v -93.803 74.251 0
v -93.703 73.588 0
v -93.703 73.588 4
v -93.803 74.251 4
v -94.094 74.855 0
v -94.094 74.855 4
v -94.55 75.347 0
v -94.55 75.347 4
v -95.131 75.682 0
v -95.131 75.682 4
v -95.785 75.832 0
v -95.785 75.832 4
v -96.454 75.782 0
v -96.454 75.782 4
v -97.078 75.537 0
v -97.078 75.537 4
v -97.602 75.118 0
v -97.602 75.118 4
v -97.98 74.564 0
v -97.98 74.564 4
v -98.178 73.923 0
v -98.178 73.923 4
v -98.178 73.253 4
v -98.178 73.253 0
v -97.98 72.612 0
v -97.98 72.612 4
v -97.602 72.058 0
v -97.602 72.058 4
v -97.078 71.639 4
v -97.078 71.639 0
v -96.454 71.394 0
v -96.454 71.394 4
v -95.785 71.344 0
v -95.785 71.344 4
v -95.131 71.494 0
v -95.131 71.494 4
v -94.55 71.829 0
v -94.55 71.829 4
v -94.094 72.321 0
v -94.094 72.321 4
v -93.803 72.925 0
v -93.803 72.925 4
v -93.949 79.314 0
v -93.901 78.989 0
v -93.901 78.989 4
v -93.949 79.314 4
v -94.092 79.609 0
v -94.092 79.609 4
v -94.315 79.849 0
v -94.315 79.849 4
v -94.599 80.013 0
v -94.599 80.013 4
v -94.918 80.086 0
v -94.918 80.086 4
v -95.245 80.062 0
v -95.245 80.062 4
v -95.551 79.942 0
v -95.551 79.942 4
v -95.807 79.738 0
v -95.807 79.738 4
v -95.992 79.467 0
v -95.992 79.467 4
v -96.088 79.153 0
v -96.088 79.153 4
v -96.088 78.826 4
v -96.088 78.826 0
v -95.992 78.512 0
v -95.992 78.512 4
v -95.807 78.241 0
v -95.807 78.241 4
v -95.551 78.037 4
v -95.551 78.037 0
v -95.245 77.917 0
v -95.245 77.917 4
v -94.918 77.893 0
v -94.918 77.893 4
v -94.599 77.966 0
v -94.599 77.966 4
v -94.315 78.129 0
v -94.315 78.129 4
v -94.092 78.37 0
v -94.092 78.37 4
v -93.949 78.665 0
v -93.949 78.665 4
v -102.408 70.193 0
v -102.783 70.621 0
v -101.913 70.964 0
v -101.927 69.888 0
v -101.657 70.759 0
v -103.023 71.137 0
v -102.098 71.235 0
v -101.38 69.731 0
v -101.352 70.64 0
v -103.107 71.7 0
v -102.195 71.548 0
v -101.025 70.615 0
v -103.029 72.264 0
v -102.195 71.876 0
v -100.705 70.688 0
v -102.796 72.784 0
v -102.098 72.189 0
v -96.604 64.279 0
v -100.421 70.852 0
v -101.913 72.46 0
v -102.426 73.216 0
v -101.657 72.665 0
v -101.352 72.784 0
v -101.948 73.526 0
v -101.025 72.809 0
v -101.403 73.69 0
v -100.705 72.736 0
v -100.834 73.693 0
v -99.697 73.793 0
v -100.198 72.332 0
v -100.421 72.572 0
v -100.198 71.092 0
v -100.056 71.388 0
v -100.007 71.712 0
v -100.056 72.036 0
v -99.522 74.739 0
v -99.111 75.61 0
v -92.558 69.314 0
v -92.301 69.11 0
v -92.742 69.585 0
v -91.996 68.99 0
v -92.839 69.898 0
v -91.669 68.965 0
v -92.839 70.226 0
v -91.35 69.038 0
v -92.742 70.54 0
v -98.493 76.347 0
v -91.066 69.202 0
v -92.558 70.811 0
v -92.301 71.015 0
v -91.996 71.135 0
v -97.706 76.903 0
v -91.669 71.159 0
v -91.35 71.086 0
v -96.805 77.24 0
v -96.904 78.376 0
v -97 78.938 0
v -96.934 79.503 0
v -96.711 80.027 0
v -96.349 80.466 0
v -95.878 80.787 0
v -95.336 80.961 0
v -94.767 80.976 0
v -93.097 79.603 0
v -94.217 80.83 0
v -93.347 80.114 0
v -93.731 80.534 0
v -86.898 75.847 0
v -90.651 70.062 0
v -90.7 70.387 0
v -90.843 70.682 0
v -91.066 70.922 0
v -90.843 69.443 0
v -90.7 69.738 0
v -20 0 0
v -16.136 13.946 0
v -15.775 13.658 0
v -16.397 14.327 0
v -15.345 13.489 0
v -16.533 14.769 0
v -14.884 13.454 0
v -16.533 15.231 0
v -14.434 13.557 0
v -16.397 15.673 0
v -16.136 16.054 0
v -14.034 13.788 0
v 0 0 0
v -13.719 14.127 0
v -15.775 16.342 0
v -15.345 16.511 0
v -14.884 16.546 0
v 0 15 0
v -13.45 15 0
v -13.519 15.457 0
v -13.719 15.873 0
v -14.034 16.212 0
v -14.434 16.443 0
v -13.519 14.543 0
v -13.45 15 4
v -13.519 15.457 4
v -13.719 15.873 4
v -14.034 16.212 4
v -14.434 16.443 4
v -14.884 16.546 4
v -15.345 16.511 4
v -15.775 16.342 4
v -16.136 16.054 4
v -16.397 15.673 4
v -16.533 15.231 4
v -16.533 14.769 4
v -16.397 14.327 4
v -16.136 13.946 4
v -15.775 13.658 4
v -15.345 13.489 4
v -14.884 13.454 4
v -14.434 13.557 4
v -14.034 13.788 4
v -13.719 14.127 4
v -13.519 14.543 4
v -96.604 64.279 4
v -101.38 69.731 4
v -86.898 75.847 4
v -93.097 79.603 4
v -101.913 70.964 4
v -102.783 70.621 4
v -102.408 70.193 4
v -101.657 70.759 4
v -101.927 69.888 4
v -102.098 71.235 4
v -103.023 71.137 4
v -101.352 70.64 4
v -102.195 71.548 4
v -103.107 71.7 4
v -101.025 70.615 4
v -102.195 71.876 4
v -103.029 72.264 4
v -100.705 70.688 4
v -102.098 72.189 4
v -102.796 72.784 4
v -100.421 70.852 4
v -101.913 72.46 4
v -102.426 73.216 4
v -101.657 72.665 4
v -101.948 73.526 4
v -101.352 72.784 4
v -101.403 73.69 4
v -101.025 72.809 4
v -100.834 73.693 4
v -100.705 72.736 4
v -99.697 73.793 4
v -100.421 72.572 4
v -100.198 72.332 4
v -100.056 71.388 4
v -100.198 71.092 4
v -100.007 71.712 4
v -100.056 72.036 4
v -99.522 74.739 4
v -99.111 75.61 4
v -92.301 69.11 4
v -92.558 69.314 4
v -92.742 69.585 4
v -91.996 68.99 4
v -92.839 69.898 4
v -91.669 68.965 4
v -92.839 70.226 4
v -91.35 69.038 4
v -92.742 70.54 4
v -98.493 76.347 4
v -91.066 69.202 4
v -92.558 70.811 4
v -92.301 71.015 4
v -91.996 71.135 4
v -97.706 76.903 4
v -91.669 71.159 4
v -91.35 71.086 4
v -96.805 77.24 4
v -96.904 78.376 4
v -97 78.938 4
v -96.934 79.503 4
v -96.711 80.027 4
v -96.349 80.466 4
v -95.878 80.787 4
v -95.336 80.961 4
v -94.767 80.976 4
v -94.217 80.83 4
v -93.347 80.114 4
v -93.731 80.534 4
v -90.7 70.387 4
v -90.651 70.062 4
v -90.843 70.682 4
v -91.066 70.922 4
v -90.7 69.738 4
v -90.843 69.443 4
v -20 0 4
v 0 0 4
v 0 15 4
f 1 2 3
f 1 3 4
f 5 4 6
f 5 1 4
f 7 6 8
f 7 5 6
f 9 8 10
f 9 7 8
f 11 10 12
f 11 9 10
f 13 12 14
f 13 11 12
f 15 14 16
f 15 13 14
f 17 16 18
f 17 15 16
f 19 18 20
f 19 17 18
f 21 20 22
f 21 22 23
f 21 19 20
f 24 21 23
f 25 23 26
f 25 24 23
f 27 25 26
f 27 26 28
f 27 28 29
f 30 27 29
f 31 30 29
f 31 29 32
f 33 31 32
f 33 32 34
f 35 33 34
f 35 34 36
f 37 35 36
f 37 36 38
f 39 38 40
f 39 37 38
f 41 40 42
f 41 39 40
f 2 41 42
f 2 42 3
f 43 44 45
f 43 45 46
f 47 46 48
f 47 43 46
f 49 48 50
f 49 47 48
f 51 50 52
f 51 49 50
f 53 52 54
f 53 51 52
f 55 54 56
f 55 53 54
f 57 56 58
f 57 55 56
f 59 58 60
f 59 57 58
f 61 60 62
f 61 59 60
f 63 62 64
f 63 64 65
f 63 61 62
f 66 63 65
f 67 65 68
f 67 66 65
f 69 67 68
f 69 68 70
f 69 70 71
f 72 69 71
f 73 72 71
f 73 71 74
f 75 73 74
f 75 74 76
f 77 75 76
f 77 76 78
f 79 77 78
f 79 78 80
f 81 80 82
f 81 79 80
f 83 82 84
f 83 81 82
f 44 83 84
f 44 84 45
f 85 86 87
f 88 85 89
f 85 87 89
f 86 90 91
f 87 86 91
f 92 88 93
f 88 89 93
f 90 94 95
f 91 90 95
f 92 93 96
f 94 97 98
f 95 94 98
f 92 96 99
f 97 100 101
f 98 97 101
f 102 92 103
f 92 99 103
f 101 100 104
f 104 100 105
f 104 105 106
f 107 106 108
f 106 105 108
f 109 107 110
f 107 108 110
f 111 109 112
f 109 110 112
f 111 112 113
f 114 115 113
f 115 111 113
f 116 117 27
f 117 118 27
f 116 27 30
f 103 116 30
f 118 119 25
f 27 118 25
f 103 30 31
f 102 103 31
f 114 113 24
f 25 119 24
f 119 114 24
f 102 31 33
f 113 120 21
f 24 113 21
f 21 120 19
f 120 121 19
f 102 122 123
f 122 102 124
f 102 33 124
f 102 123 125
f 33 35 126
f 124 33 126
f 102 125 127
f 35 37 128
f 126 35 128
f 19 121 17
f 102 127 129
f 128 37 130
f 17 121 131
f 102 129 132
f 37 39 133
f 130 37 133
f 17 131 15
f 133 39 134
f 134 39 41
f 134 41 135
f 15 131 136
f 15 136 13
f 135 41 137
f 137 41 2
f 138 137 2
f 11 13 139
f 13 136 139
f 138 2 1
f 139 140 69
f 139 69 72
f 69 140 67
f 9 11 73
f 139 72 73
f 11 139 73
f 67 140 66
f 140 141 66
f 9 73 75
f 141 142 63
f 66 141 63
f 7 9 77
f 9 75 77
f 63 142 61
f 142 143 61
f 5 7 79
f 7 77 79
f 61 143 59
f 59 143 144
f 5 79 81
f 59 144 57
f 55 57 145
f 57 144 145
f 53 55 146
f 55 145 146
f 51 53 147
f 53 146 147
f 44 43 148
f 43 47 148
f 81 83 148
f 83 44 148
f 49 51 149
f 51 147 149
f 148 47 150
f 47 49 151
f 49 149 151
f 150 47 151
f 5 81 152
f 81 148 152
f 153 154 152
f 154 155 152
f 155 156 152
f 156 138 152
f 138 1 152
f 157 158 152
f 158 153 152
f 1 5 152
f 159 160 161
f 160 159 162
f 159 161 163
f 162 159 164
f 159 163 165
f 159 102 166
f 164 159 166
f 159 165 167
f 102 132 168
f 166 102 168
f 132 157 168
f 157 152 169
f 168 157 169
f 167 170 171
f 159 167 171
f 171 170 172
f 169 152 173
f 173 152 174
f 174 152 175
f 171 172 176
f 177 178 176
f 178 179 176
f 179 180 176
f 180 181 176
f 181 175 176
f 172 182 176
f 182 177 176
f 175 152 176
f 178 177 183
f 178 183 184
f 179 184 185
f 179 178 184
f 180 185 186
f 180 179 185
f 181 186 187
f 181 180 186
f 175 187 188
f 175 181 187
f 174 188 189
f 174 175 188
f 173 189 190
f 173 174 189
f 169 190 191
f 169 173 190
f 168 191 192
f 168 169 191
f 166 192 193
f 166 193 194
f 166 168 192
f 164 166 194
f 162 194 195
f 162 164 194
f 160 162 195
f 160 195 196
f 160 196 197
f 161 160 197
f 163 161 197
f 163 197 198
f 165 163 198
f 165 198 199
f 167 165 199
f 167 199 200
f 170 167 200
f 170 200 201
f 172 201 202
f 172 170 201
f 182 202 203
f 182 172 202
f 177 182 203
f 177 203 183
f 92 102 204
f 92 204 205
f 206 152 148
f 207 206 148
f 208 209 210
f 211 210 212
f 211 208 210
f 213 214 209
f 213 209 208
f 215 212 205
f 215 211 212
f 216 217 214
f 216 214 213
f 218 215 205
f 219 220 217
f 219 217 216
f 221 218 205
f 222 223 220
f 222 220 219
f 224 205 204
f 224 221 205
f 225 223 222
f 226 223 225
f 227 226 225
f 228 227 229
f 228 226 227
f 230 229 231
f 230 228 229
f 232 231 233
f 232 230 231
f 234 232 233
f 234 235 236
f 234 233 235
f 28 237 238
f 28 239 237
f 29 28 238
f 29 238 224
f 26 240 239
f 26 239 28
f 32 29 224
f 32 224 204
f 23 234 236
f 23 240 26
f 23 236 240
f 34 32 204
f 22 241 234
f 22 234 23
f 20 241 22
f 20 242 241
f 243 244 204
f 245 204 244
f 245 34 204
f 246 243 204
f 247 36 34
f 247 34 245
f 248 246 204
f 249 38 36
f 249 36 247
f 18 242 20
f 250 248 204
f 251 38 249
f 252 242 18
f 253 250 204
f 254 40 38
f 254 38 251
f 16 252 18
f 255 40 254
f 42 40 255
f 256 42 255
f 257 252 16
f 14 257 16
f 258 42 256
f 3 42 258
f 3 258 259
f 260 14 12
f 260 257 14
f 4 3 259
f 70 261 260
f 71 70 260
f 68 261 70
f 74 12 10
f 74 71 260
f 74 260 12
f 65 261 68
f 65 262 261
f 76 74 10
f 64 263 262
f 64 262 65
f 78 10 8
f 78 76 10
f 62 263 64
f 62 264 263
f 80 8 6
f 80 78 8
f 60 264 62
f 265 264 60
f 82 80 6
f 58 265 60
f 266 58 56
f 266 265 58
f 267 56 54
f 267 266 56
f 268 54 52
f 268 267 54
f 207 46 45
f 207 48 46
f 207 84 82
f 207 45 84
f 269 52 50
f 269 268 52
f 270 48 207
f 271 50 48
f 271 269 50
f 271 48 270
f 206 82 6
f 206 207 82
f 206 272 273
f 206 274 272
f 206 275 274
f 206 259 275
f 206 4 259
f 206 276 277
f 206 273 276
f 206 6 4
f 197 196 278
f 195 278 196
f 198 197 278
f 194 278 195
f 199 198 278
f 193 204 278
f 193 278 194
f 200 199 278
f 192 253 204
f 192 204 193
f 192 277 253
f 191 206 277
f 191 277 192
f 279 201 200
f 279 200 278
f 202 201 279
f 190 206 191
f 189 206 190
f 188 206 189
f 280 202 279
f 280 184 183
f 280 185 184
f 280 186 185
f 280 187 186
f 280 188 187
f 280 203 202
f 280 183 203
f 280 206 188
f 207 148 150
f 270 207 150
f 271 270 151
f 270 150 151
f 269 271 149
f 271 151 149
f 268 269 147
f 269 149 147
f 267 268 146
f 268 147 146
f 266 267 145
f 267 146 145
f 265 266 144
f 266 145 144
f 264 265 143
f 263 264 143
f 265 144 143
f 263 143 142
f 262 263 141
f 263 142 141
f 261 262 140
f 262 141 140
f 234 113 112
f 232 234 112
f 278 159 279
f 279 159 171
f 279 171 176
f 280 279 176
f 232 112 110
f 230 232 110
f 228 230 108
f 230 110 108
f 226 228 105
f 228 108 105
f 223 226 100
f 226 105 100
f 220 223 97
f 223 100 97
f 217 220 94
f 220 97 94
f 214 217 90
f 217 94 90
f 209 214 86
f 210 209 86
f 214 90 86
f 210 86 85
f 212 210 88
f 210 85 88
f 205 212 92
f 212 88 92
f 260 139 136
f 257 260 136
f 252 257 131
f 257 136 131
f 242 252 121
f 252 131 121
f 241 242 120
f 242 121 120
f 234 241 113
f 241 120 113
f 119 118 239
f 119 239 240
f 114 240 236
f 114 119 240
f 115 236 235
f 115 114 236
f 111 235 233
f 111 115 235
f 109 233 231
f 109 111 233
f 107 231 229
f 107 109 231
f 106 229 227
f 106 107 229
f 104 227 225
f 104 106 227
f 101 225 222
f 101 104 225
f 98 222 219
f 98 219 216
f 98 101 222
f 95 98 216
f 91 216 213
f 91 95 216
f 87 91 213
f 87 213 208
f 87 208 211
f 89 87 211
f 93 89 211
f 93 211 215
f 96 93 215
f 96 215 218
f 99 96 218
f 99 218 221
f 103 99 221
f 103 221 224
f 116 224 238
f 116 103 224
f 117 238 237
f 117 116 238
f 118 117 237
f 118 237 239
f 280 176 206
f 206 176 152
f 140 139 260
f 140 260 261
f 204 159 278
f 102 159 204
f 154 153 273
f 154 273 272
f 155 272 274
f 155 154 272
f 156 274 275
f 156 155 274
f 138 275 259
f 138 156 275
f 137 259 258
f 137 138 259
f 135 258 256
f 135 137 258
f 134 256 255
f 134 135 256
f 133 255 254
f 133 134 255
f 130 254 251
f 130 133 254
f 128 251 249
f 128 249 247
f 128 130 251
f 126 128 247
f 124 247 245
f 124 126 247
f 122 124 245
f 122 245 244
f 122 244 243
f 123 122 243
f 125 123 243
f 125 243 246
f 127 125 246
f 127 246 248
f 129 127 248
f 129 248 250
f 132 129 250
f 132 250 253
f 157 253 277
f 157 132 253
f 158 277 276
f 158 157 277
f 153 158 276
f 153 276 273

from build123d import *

# Parameters (mm, degrees)
SKETCH_R   = 1.1
SKETCH_R_2 = 2.25
SKETCH_R_3 = 1.55
PAD_DEPTH  = 4


with BuildPart() as part:
    # Sketch → Pad (new body)
    with BuildSketch(Plane.XY):
        with BuildLine():
            Line((-20, 0), (0, 0))
            Line((0, 0), (0, 15))
            Line((0, 15), (-86.897903, 75.846567))
            Line((-86.897903, 75.846567), (-93.096869, 79.602543))
            ThreePointArc((-93.096869, 79.602543), (-95.613656, 80.893196), (-96.904309, 78.37641))
            Line((-96.804881, 77.239939), (-96.904309, 78.37641))
            ThreePointArc((-96.804881, 77.239939), (-98.825686, 75.998429), (-99.697425, 73.792739))
            Line((-99.697425, 73.792739), (-100.833896, 73.69331))
            ThreePointArc((-100.833896, 73.69331), (-103.088327, 71.985229), (-101.380247, 69.730798))
            Line((-96.604444, 64.278761), (-101.380247, 69.730798))
            Line((-20, 0), (-96.604444, 64.278761))
        make_face()
        with Locations((-91.751398, 70.062397)):
            Circle(SKETCH_R, mode=Mode.SUBTRACT)
        with Locations((-95.000589, 78.989476)):
            Circle(SKETCH_R, mode=Mode.SUBTRACT)
        with Locations((-101.107072, 71.712054)):
            Circle(SKETCH_R, mode=Mode.SUBTRACT)
        with Locations((-95.95302, 73.587976)):
            Circle(SKETCH_R_2, mode=Mode.SUBTRACT)
        with Locations((-15, 15)):
            Circle(SKETCH_R_3, mode=Mode.SUBTRACT)
    extrude(amount=PAD_DEPTH)


solid = part.part
